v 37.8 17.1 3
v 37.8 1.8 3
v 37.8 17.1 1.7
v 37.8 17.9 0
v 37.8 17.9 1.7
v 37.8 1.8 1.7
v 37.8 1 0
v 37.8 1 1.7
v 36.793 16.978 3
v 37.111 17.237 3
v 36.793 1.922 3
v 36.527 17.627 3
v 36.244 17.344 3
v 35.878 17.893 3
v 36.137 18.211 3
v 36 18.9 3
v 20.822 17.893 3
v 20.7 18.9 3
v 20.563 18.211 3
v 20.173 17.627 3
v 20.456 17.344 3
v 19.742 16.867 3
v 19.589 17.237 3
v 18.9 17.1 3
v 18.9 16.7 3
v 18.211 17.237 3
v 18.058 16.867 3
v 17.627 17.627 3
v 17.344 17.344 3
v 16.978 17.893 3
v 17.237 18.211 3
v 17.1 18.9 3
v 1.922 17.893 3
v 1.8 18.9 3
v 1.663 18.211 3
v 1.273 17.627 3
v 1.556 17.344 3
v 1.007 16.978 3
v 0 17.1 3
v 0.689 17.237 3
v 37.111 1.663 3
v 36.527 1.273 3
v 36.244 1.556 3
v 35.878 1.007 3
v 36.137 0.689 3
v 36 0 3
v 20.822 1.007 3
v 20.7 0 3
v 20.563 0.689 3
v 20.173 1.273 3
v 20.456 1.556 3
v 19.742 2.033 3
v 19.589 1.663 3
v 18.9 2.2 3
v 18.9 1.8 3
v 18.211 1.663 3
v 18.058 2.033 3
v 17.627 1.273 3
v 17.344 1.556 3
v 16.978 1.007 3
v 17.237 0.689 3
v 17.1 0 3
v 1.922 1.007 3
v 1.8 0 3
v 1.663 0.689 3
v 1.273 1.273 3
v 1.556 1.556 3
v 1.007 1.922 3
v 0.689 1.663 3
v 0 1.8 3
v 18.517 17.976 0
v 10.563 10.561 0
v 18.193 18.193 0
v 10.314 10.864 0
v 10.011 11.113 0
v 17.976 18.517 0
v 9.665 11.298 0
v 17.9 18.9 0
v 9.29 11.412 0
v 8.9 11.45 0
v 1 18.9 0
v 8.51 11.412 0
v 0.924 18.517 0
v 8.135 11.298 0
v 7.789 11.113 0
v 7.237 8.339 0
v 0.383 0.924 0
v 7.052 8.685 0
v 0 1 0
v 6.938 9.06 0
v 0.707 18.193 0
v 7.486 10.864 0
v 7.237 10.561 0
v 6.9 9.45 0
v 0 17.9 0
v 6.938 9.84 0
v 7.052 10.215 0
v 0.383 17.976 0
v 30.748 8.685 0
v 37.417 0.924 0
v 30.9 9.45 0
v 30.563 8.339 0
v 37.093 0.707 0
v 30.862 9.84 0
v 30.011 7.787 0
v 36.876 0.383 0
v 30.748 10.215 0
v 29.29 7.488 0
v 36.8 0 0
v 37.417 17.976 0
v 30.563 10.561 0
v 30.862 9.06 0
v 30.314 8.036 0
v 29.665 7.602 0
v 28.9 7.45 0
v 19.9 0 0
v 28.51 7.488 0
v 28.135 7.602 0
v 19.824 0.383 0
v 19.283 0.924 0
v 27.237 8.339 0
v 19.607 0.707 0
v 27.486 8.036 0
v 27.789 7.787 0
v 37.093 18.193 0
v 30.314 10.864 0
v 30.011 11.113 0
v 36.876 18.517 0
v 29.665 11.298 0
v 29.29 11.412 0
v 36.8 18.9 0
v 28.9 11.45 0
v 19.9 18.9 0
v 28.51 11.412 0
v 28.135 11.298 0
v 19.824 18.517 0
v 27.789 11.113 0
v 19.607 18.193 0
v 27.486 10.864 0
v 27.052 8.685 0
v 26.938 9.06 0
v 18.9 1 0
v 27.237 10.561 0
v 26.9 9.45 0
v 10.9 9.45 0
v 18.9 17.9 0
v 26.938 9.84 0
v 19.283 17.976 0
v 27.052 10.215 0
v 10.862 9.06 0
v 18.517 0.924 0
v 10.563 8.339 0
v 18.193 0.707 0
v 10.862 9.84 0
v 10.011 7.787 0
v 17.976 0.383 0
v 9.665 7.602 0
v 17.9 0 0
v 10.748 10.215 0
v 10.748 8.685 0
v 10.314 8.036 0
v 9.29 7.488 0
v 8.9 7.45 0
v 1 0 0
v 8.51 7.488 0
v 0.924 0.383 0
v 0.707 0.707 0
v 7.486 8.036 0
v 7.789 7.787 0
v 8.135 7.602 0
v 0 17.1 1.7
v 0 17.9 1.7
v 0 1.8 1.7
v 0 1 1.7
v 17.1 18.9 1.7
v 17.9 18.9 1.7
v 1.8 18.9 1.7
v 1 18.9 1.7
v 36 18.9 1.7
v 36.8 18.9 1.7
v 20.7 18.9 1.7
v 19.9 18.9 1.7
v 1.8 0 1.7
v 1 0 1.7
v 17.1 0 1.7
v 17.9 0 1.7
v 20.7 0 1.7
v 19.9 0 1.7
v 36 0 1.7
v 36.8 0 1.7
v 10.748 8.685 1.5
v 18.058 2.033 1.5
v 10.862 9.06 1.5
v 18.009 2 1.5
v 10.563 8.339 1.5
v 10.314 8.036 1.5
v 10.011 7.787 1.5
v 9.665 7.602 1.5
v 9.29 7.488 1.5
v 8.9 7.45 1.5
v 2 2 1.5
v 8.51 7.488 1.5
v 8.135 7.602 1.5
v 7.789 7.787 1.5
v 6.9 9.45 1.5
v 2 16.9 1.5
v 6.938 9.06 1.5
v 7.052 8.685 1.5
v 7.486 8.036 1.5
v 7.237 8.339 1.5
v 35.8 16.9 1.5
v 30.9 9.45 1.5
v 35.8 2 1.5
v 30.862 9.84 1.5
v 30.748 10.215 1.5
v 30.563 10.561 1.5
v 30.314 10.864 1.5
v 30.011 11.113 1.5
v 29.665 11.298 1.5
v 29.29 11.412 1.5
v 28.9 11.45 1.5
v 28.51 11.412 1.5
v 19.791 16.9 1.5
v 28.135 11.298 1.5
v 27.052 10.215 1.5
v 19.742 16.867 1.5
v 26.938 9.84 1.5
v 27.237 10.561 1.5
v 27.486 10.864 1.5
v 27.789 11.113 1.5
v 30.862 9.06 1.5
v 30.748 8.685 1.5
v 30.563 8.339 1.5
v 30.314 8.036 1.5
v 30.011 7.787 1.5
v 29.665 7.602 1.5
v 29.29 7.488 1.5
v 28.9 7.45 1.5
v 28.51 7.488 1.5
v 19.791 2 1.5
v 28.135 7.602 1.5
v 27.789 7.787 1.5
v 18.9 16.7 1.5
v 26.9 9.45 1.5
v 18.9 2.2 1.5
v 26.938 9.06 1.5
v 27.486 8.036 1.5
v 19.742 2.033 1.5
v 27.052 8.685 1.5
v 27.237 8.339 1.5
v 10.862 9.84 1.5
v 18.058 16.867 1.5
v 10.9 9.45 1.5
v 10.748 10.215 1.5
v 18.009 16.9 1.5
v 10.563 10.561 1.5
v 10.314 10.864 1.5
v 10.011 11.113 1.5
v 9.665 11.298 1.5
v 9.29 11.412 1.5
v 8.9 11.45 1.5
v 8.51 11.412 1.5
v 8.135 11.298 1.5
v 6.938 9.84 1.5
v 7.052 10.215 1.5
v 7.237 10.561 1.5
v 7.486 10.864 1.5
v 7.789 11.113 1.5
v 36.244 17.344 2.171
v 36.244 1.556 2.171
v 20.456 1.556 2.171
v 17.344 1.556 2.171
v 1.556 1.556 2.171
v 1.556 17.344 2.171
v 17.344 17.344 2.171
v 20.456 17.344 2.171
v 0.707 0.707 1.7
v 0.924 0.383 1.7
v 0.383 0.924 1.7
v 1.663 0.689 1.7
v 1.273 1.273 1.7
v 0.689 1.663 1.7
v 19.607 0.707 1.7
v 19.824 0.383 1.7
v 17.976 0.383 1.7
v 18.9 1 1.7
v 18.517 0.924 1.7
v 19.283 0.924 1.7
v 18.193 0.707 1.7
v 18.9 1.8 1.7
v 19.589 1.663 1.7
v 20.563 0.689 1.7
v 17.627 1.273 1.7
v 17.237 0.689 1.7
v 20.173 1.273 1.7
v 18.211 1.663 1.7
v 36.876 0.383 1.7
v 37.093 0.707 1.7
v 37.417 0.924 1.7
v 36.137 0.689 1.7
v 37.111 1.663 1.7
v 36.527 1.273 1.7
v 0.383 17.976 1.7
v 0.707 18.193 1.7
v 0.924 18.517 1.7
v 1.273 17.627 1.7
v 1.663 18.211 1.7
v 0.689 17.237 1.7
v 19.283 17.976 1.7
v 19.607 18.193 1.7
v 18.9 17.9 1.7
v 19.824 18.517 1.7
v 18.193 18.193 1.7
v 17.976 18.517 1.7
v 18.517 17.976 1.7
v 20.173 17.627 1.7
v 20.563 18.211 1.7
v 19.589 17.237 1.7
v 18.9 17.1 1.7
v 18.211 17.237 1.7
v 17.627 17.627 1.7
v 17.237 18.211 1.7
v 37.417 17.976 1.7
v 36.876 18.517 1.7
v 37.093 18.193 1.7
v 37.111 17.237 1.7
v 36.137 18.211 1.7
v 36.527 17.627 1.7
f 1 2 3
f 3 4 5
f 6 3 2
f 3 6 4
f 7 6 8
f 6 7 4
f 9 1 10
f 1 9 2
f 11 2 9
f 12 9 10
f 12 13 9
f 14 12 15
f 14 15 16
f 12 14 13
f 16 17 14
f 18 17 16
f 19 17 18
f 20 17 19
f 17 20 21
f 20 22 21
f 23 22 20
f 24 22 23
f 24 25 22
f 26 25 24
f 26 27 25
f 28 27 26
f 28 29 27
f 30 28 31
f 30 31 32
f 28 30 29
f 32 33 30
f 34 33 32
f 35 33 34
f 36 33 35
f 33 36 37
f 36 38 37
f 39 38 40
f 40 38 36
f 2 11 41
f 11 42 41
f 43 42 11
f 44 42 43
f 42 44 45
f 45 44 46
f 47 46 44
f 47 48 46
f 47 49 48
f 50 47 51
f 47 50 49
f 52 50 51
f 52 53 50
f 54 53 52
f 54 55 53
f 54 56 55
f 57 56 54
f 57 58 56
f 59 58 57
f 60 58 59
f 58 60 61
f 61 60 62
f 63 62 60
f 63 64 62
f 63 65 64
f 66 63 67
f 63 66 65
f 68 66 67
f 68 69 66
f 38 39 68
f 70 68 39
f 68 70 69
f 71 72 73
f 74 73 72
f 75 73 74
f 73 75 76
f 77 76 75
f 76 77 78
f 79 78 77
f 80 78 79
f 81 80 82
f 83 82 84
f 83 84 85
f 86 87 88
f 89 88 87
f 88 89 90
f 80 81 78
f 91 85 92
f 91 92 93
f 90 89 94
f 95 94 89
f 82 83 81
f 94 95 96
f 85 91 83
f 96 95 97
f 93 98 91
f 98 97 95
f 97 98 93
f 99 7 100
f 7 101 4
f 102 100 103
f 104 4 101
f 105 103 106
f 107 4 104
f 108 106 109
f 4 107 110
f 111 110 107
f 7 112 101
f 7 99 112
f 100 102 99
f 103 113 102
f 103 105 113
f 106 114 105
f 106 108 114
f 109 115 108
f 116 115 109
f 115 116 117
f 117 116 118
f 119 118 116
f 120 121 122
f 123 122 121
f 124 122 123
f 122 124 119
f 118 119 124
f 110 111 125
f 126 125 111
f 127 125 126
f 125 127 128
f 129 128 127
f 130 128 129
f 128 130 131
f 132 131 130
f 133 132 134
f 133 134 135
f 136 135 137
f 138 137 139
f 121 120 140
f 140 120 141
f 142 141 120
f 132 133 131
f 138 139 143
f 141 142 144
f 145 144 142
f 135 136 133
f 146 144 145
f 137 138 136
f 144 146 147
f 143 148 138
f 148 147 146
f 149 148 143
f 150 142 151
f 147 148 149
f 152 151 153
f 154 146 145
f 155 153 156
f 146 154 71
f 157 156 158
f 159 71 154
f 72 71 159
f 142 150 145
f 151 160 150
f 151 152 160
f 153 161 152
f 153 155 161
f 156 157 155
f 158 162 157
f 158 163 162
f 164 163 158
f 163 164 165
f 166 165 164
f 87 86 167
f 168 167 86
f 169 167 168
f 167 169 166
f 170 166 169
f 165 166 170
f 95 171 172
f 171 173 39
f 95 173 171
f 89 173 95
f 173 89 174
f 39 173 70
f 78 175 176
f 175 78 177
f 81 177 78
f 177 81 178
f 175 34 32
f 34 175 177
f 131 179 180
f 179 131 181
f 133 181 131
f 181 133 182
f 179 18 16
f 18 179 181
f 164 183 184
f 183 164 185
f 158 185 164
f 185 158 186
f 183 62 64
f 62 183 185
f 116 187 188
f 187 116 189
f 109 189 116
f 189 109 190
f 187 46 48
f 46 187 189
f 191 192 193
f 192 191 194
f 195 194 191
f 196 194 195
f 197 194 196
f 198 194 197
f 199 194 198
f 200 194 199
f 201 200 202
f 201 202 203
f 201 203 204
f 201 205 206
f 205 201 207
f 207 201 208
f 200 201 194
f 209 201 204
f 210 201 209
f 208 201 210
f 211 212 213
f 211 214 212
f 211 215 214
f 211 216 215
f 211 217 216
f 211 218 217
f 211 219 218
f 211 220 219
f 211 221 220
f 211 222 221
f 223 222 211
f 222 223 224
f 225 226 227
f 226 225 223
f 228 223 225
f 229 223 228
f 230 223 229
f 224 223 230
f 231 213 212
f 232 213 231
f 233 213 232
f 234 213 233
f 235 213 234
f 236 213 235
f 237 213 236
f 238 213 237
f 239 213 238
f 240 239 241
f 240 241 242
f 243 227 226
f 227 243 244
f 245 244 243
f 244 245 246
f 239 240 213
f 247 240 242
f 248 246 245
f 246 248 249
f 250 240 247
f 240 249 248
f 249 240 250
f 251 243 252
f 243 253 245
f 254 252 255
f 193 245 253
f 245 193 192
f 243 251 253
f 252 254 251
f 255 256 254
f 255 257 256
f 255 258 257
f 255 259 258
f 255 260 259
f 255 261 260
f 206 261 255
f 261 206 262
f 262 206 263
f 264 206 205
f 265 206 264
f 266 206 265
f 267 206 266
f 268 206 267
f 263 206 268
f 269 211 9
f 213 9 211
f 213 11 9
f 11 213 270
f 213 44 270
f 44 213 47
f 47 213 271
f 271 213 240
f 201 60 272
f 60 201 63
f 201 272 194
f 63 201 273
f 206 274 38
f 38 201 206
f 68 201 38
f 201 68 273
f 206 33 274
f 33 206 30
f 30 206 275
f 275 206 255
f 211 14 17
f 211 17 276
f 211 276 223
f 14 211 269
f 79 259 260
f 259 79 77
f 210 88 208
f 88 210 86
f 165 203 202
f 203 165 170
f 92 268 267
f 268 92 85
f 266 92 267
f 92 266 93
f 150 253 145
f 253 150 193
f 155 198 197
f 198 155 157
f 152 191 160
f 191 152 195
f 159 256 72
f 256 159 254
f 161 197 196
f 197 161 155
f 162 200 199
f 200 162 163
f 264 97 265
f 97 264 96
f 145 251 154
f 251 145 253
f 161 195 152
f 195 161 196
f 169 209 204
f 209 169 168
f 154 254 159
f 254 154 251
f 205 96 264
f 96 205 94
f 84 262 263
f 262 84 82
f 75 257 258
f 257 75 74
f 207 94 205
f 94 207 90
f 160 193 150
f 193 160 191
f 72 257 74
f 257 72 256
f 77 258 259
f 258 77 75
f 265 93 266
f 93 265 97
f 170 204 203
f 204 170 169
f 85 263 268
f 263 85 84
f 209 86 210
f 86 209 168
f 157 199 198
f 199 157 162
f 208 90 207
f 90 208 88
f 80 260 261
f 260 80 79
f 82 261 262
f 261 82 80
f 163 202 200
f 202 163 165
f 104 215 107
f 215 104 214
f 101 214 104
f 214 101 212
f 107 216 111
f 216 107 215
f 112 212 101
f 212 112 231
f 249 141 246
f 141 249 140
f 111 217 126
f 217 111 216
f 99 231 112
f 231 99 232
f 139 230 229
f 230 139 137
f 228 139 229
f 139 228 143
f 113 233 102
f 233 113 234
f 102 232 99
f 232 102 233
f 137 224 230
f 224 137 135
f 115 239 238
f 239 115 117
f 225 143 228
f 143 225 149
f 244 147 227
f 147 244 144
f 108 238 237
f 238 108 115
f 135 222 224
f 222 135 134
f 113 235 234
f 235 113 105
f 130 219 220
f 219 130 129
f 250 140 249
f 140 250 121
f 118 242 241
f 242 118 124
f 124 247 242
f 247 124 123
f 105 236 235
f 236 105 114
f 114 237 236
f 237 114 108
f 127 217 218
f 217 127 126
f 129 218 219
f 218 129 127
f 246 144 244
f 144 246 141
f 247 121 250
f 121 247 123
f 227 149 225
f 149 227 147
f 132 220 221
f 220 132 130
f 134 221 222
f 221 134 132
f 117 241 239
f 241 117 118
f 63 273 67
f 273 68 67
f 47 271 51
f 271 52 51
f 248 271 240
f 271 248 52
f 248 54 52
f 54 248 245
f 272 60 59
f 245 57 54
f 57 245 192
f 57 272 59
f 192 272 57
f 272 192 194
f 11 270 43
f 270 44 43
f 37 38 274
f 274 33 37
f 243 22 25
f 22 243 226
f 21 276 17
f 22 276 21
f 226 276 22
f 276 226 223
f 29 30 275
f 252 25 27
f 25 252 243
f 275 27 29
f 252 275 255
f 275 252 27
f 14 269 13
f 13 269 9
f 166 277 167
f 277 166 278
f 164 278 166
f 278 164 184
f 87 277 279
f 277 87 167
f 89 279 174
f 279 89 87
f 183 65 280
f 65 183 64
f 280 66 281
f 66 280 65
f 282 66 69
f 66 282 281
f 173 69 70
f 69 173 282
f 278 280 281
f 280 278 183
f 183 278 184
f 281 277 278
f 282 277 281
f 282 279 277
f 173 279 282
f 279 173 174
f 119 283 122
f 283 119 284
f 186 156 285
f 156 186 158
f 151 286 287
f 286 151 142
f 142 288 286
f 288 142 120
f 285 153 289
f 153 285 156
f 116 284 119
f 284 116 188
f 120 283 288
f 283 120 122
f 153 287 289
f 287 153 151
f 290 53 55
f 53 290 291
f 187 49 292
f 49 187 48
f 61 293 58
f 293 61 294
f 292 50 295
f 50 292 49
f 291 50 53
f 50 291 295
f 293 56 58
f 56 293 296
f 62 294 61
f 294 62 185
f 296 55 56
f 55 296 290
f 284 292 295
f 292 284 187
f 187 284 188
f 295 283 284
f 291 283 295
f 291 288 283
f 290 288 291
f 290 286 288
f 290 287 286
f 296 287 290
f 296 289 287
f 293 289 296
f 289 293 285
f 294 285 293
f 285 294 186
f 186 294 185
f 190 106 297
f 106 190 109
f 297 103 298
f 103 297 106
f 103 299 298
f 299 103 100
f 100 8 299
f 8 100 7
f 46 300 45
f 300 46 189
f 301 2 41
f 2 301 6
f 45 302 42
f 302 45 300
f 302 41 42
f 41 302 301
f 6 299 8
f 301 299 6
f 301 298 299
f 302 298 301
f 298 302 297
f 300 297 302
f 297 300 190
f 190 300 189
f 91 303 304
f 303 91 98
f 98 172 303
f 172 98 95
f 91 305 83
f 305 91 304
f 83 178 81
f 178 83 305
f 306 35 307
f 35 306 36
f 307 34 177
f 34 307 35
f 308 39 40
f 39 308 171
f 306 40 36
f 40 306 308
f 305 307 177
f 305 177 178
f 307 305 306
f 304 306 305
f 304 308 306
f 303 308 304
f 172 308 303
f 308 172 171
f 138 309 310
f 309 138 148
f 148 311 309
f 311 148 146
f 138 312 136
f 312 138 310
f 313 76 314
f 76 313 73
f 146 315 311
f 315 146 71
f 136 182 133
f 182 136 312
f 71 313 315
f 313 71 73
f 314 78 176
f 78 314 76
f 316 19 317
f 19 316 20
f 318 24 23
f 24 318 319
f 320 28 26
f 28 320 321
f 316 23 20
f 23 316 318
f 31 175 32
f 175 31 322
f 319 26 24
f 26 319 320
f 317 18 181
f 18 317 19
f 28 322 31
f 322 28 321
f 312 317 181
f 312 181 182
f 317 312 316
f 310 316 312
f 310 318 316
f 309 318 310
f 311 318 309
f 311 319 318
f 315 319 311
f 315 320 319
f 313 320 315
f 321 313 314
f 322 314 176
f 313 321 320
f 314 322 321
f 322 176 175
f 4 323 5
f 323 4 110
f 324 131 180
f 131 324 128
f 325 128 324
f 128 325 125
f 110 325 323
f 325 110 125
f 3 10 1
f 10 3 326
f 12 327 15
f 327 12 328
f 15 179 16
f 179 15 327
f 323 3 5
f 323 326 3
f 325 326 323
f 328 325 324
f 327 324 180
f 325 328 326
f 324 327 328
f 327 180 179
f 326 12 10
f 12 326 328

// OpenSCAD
//OpenSCAD-Skript

//Moduldefinition mit Parametern für Frontplattensystem im 19mm-Raster
module FrontElem (
//Parameter
xwert=2,        //Anzahl der Segmente in horizontaler Richtung
ywert=1,        //Anzahl der Segmente in vertikaler Richtung
segment=18.9,   //Kantenlänge des Segments
hght=3.0,       //Höhe des Rands des Frontplattensegments
thick=1.5,      //verbleibende Dicke des Frontplattensegments
wo=1.0,         //Wandstärke oben
wu=2.0,         //Wandstärke unten
M3=false,       //Bohrungen für M3-Zylinderkopf-Inbusschraube
skd3=5.6,       //Schraubenkopfdurchmesser M3-Schraube
skh3=3.3,       //Schraubenkopfhöhe M3-Schraube
dsh3=3.1,       //Schaftdurchmesser M3-Schraube
dvst3=7,        //Verstärkung für M3-Schraube
B2mm=true,      //Bohrungen für 2mm-Schneidschrauben
skd2=3.6,       //Schraubenkopfdurchmesser 2mm-Schraube (4.4)
skh2=1.3,       //Schraubenkopfhöhe 2mm-Schraube
dsh2=2.0,       //Schaftdurchmesser 2mm-Schraube
dvst2=4.4,      //Verstärkung für 2mm-Schraube
Btext=6.0,      //Breite Beschriftungsband
Ltext=12,       //Länge Beschriftungsband
Dtext=0.3,      //Tiefe Beschriftungsfeld, oder Null
LEDdia=3.0,     //Durchmesser LED
LEDr=5.0,       //Kantenlänge quadratische LED
LEDB=5.0,       //Breite der Rechteck-LED
LEDH=3.0,       //Höhe der Rechteck-LED
KSWdia=6.0,     //Schaftdurchmesser Kippschalter
RSWdia=9.2,     //Schaftdurchmesser Drehschalter
RSWdist=9.4,    //Mittenabstand Pin
RSWpin=3.0,     //Durchmesser Pin
POTdia=6.8,     //Schaftdurchmesser Poti
TRMdia=4.0,     //Bohrung für Polklemme M4
TRSdia=6.0,     //Bohrung für Telefonbuchse 4mm
MCdia=11.8,     //Bohrung für MC-Buchse 4mm
MCdist=10.4,    //Abstand Abflachungen
BNCdia=9.5,     //Durchmesser Bohrung
BNCdist=8.0,    //Abstand Abflachung
PM3B=22.5,      //Breite Panelmeter 3-stellig
PM3H=14.5,      //Höhe Panelmeter 3-stellig
PM4B=30.0,      //Breite Panelmeter 4-stellig
PM4H=14.2      //Höhe Panelmeter 4-stellig

)
//Beginn Modul
{
difference(){   //difference 1
union(){        //union 1
difference(){   //difference 2
union(){        //union 2
    //alles, was vor der nächsten geschweiften Klammer steht, wird zusammengefügt (union 2)
//Körper des Frontplattensegments
cube([xwert*segment, ywert*segment, hght]);


}               //union 2 end
    //alles, was vor der nächsten geschweiften Klammer steht, wird davon abgezogen (difference 2)
//Einsenkung in das Segment
polyhedron(
               points= [[wu,wu,thick],                                  //0 unten
                        [xwert*segment-wu,wu,thick],                    //1 unten
                        [xwert*segment-wu,ywert*segment-wu,thick],      //2 unten
                        [wu,ywert*segment-wu,thick],                    //3 unten
                        [wo,wo,hght+0.01],                              //4 oben
                        [wo,ywert*segment-wo, hght+0.01],               //5 oben
                        [xwert*segment-wo,ywert*segment-wo,hght+0.01],  //6 oben
                        [xwert*segment-wo,wo,hght+0.01],                //7 oben
                       ],
               faces=  [[0,1,2,3],      //Boden
                        [0,4,7,1],      //Deckel
                        [1,7,6,2],      //Front
                        [2,6,5,3],      //Seitenwand rechts
                        [3,5,4,0],      //Rückwand
                        [4,5,6,7]]      //Seitenwand links
               );   
/*
//Bohrung für LED mittig (Mindestgröße 1x1)
translate([xwert*segment/2,ywert*segment/2-3,-0.1])  cylinder(d=LEDdia, h=10, $fn=32);
*/

/*
//Bohrung für 2x 3mm-LED nach unten versetzt mit Textfeld darüber (Mindestgröße 1x1, bei 10mm LED 1x2)
translate([xwert*segment/2-3,ywert*segment/2-3,-0.1])  cylinder(d=LEDdia, h=10, $fn=32);
translate([xwert*segment/2+3,ywert*segment/2-3,-0.1])  cylinder(d=LEDdia, h=10, $fn=32);
translate([xwert*segment/2-Ltext/2,ywert*segment/2,thick-Dtext+0.05])  cube([Ltext, Btext, Dtext]); 
*/

/*
//Bohrung für Kippschalter mittig (Mindestgröße 1x1)
translate([xwert*segment/2,ywert*segment/2,-0.1])  cylinder(d=KSWdia, h=10, $fn=32); 
*/

/*
//Bohrungen für Drehschalter mit Pin (Mindestgröße 2x2)
translate([xwert*segment/2,ywert*segment/2,-0.1])  cylinder(d=RSWdia, h=10, $fn=32);
translate([xwert*segment/2+RSWdist,ywert*segment/2,-0.1])  cylinder(d=RSWpin, h=1.5, $fn=32);
*/

/*
//Bohrung für Potentiometer 3mm-Schaft (Mindestgröße 1x1)
translate([xwert*segment/2,ywert*segment/2,-0.1])  cylinder(d=POTdia, h=10, $fn=32);
*/


//Bohrung für 2x 4mm-Polklemme M4 (Mindestgröße 1x1)
translate([xwert*segment/2-10,ywert*segment/2,-0.1])  cylinder(d=TRMdia, h=10, $fn=32);
translate([xwert*segment/2+10,ywert*segment/2,-0.1])  cylinder(d=TRMdia, h=10, $fn=32);

/*
//Bohrung für 4mm-Telefonbuchse (Mindestgröße 1x1)
translate([xwert*segment/2,ywert*segment/2,-0.1])  cylinder(d=TRSdia, h=10, $fn=32);
*/

/*
//Bohrung für 4mm-MC-Buchse (Mindestgröße 2x2), siehe auch union1 für Abflachungen
translate([xwert*segment/2,ywert*segment/2,-0.1])  cylinder(d=MCdia, h=10, $fn=32);
*/

/*
//Bohrung für BNC-Buchse (Mindestgröße 1x1), siehe auch union1 für Abflachungen
translate([xwert*segment/2,ywert*segment/2,-0.1])  cylinder(d=BNCdia, h=10, $fn=32);
*/

/*
//Ausschnitt Panelmeter 3-stellig (Mindestgröße 2x1)
translate([xwert*segment/2-PM3B/2,ywert*segment/2-PM3H/2,-0.1])  cube([PM3B, PM3H, 10]);
*/

/*
//Ausschnitt Panelmeter 4-stellig (Mindestgröße 2x1)
translate([xwert*segment/2-PM4B/2,ywert*segment/2-PM4H/2,-0.1])  cube([PM4B, PM4H, 10]);
*/       
        
}  //difference 2 end
    //alles, was vor der nächsten geschweiften Klammer steht, wird dazu hinzugefügt (union 1)
//Verstärkungen für Schrauben x-Achse unten
for (x=[0:segment:xwert*segment])
{
if (M3==true) translate([x,0,0]) cylinder(d=dvst3,h=hght,$fn=16);
if (B2mm==true) translate([x,0,0]) cylinder(d=dvst2,h=hght,$fn=16);
}
//Verstärkungen für Schrauben x-Achse oben
for (x=[0:segment:xwert*segment])
{
if (M3==true) translate([x,ywert*segment,0]) cylinder(d=dvst3,h=hght,$fn=16);
if (B2mm==true) translate([x,ywert*segment,0]) cylinder(d=dvst2,h=hght,$fn=16);
}
//Verstärkungen für Schrauben y-Achse links
for (y=[0:segment:ywert*segment])
{
if (M3==true) translate([0,y,0]) cylinder(d=dvst3,h=hght,$fn=16);
if (B2mm==true) translate([0,y,0]) cylinder(d=dvst2,h=hght,$fn=16);
}
//Verstärkungen für Schrauben y-Achse rechts
for (y=[0:segment:ywert*segment])
{
if (M3==true) translate([xwert*segment,y,0]) cylinder(d=dvst3,h=hght,$fn=16);
if (B2mm==true) translate([xwert*segment,y,0]) cylinder(d=dvst2,h=hght,$fn=16);
}

/*
//Abflachungen für 4mm-MC-Buchse (Mindestgröße 2x2)
translate([xwert*segment/2-5,ywert*segment/2+MCdist/2,0])  cube([10,3,thick]);
translate([xwert*segment/2-5,ywert*segment/2-MCdist/2-3,0])  cube([10,3,thick]);
*/

/*
//Abflachungen für BNC-Buchse (Mindestgröße 1x1)
translate([xwert*segment/2-5,ywert*segment/2+BNCdist/2,0])  cube([10,3,thick]);
translate([xwert*segment/2-5,ywert*segment/2-BNCdist/2-3,0])  cube([10,3,thick]);
*/

}               //union 1 end
    //alles, was vor der nächsten geschweiften Klammer steht, wird davon wieder abgezogen (difference 1)
//Bohrungen für Schrauben x-Achse unten
for (x=[0:segment:xwert*segment])
{
if (M3==true) translate([x,0,-0.1]) cylinder(d=dsh3,h=2*hght,$fn=16);
if (M3==true) translate([x,0,hght-skh3]) cylinder(d=skd3,h=2*hght,$fn=16);
if (B2mm==true) translate([x,0,-0.1]) cylinder(d=dsh2,h=2*hght,$fn=16);
if (B2mm==true) translate([x,0,hght-skh2]) cylinder(d=skd2,h=2*hght,$fn=16); 
}
//Bohrungen für Schrauben x-Achse oben
for (x=[0:segment:xwert*segment])
{
if (M3==true) translate([x,ywert*segment,-0.1]) cylinder(d=dsh3,h=2*hght,$fn=16);
if (M3==true) translate([x,ywert*segment,hght-skh3]) cylinder(d=skd3,h=2*hght,$fn=16);
if (B2mm==true) translate([x,ywert*segment,-0.1]) cylinder(d=dsh2,h=2*hght,$fn=16);
if (B2mm==true) translate([x,ywert*segment,hght-skh2]) cylinder(d=skd2,h=2*hght,$fn=16); 
}
//Bohrungen für Schrauben y-Achse links
for (y=[0:segment:ywert*segment])
{
if (M3==true) translate([0,y,-0.1]) cylinder(d=dsh3,h=2*hght,$fn=16);
if (M3==true) translate([0,y,hght-skh3]) cylinder(d=skd3,h=2*hght,$fn=16);
if (B2mm==true) translate([0,y,-0.1]) cylinder(d=dsh2,h=2*hght,$fn=16);
if (B2mm==true) translate([0,y,hght-skh2]) cylinder(d=skd2,h=2*hght,$fn=16); 
}
//Bohrungen für Schrauben y-Achse rechts
for (y=[0:segment:ywert*segment])
{
if (M3==true) translate([xwert*segment,y,-0.1]) cylinder(d=dsh3,h=2*hght,$fn=16);
if (M3==true) translate([xwert*segment,y,hght-skh3]) cylinder(d=skd3,h=2*hght,$fn=16);
if (B2mm==true) translate([xwert*segment,y,-0.1]) cylinder(d=dsh2,h=2*hght,$fn=16);
if (B2mm==true) translate([xwert*segment,y,hght-skh2]) cylinder(d=skd2,h=2*hght,$fn=16); 
}
//Abschneiden Verstärkungen unten
translate([-250,-10,-0.1])
cube([500,10,25]);
//Abschneiden Verstärkungen oben
translate([-250,ywert*segment,-0.1])
cube([500,10,25]);
//Abschneiden Verstärkungen links
translate([-10,-250,-0.1])
cube([10,500,25]);
//Abschneiden Verstärkungen rechts
translate([xwert*segment,-250,-0.1])
cube([10,500,25]);
}               //difference 1 end

}  //module end

//Hier werden Instanzen des Moduls aufgerufen
translate([0,0,0]) FrontElem();
